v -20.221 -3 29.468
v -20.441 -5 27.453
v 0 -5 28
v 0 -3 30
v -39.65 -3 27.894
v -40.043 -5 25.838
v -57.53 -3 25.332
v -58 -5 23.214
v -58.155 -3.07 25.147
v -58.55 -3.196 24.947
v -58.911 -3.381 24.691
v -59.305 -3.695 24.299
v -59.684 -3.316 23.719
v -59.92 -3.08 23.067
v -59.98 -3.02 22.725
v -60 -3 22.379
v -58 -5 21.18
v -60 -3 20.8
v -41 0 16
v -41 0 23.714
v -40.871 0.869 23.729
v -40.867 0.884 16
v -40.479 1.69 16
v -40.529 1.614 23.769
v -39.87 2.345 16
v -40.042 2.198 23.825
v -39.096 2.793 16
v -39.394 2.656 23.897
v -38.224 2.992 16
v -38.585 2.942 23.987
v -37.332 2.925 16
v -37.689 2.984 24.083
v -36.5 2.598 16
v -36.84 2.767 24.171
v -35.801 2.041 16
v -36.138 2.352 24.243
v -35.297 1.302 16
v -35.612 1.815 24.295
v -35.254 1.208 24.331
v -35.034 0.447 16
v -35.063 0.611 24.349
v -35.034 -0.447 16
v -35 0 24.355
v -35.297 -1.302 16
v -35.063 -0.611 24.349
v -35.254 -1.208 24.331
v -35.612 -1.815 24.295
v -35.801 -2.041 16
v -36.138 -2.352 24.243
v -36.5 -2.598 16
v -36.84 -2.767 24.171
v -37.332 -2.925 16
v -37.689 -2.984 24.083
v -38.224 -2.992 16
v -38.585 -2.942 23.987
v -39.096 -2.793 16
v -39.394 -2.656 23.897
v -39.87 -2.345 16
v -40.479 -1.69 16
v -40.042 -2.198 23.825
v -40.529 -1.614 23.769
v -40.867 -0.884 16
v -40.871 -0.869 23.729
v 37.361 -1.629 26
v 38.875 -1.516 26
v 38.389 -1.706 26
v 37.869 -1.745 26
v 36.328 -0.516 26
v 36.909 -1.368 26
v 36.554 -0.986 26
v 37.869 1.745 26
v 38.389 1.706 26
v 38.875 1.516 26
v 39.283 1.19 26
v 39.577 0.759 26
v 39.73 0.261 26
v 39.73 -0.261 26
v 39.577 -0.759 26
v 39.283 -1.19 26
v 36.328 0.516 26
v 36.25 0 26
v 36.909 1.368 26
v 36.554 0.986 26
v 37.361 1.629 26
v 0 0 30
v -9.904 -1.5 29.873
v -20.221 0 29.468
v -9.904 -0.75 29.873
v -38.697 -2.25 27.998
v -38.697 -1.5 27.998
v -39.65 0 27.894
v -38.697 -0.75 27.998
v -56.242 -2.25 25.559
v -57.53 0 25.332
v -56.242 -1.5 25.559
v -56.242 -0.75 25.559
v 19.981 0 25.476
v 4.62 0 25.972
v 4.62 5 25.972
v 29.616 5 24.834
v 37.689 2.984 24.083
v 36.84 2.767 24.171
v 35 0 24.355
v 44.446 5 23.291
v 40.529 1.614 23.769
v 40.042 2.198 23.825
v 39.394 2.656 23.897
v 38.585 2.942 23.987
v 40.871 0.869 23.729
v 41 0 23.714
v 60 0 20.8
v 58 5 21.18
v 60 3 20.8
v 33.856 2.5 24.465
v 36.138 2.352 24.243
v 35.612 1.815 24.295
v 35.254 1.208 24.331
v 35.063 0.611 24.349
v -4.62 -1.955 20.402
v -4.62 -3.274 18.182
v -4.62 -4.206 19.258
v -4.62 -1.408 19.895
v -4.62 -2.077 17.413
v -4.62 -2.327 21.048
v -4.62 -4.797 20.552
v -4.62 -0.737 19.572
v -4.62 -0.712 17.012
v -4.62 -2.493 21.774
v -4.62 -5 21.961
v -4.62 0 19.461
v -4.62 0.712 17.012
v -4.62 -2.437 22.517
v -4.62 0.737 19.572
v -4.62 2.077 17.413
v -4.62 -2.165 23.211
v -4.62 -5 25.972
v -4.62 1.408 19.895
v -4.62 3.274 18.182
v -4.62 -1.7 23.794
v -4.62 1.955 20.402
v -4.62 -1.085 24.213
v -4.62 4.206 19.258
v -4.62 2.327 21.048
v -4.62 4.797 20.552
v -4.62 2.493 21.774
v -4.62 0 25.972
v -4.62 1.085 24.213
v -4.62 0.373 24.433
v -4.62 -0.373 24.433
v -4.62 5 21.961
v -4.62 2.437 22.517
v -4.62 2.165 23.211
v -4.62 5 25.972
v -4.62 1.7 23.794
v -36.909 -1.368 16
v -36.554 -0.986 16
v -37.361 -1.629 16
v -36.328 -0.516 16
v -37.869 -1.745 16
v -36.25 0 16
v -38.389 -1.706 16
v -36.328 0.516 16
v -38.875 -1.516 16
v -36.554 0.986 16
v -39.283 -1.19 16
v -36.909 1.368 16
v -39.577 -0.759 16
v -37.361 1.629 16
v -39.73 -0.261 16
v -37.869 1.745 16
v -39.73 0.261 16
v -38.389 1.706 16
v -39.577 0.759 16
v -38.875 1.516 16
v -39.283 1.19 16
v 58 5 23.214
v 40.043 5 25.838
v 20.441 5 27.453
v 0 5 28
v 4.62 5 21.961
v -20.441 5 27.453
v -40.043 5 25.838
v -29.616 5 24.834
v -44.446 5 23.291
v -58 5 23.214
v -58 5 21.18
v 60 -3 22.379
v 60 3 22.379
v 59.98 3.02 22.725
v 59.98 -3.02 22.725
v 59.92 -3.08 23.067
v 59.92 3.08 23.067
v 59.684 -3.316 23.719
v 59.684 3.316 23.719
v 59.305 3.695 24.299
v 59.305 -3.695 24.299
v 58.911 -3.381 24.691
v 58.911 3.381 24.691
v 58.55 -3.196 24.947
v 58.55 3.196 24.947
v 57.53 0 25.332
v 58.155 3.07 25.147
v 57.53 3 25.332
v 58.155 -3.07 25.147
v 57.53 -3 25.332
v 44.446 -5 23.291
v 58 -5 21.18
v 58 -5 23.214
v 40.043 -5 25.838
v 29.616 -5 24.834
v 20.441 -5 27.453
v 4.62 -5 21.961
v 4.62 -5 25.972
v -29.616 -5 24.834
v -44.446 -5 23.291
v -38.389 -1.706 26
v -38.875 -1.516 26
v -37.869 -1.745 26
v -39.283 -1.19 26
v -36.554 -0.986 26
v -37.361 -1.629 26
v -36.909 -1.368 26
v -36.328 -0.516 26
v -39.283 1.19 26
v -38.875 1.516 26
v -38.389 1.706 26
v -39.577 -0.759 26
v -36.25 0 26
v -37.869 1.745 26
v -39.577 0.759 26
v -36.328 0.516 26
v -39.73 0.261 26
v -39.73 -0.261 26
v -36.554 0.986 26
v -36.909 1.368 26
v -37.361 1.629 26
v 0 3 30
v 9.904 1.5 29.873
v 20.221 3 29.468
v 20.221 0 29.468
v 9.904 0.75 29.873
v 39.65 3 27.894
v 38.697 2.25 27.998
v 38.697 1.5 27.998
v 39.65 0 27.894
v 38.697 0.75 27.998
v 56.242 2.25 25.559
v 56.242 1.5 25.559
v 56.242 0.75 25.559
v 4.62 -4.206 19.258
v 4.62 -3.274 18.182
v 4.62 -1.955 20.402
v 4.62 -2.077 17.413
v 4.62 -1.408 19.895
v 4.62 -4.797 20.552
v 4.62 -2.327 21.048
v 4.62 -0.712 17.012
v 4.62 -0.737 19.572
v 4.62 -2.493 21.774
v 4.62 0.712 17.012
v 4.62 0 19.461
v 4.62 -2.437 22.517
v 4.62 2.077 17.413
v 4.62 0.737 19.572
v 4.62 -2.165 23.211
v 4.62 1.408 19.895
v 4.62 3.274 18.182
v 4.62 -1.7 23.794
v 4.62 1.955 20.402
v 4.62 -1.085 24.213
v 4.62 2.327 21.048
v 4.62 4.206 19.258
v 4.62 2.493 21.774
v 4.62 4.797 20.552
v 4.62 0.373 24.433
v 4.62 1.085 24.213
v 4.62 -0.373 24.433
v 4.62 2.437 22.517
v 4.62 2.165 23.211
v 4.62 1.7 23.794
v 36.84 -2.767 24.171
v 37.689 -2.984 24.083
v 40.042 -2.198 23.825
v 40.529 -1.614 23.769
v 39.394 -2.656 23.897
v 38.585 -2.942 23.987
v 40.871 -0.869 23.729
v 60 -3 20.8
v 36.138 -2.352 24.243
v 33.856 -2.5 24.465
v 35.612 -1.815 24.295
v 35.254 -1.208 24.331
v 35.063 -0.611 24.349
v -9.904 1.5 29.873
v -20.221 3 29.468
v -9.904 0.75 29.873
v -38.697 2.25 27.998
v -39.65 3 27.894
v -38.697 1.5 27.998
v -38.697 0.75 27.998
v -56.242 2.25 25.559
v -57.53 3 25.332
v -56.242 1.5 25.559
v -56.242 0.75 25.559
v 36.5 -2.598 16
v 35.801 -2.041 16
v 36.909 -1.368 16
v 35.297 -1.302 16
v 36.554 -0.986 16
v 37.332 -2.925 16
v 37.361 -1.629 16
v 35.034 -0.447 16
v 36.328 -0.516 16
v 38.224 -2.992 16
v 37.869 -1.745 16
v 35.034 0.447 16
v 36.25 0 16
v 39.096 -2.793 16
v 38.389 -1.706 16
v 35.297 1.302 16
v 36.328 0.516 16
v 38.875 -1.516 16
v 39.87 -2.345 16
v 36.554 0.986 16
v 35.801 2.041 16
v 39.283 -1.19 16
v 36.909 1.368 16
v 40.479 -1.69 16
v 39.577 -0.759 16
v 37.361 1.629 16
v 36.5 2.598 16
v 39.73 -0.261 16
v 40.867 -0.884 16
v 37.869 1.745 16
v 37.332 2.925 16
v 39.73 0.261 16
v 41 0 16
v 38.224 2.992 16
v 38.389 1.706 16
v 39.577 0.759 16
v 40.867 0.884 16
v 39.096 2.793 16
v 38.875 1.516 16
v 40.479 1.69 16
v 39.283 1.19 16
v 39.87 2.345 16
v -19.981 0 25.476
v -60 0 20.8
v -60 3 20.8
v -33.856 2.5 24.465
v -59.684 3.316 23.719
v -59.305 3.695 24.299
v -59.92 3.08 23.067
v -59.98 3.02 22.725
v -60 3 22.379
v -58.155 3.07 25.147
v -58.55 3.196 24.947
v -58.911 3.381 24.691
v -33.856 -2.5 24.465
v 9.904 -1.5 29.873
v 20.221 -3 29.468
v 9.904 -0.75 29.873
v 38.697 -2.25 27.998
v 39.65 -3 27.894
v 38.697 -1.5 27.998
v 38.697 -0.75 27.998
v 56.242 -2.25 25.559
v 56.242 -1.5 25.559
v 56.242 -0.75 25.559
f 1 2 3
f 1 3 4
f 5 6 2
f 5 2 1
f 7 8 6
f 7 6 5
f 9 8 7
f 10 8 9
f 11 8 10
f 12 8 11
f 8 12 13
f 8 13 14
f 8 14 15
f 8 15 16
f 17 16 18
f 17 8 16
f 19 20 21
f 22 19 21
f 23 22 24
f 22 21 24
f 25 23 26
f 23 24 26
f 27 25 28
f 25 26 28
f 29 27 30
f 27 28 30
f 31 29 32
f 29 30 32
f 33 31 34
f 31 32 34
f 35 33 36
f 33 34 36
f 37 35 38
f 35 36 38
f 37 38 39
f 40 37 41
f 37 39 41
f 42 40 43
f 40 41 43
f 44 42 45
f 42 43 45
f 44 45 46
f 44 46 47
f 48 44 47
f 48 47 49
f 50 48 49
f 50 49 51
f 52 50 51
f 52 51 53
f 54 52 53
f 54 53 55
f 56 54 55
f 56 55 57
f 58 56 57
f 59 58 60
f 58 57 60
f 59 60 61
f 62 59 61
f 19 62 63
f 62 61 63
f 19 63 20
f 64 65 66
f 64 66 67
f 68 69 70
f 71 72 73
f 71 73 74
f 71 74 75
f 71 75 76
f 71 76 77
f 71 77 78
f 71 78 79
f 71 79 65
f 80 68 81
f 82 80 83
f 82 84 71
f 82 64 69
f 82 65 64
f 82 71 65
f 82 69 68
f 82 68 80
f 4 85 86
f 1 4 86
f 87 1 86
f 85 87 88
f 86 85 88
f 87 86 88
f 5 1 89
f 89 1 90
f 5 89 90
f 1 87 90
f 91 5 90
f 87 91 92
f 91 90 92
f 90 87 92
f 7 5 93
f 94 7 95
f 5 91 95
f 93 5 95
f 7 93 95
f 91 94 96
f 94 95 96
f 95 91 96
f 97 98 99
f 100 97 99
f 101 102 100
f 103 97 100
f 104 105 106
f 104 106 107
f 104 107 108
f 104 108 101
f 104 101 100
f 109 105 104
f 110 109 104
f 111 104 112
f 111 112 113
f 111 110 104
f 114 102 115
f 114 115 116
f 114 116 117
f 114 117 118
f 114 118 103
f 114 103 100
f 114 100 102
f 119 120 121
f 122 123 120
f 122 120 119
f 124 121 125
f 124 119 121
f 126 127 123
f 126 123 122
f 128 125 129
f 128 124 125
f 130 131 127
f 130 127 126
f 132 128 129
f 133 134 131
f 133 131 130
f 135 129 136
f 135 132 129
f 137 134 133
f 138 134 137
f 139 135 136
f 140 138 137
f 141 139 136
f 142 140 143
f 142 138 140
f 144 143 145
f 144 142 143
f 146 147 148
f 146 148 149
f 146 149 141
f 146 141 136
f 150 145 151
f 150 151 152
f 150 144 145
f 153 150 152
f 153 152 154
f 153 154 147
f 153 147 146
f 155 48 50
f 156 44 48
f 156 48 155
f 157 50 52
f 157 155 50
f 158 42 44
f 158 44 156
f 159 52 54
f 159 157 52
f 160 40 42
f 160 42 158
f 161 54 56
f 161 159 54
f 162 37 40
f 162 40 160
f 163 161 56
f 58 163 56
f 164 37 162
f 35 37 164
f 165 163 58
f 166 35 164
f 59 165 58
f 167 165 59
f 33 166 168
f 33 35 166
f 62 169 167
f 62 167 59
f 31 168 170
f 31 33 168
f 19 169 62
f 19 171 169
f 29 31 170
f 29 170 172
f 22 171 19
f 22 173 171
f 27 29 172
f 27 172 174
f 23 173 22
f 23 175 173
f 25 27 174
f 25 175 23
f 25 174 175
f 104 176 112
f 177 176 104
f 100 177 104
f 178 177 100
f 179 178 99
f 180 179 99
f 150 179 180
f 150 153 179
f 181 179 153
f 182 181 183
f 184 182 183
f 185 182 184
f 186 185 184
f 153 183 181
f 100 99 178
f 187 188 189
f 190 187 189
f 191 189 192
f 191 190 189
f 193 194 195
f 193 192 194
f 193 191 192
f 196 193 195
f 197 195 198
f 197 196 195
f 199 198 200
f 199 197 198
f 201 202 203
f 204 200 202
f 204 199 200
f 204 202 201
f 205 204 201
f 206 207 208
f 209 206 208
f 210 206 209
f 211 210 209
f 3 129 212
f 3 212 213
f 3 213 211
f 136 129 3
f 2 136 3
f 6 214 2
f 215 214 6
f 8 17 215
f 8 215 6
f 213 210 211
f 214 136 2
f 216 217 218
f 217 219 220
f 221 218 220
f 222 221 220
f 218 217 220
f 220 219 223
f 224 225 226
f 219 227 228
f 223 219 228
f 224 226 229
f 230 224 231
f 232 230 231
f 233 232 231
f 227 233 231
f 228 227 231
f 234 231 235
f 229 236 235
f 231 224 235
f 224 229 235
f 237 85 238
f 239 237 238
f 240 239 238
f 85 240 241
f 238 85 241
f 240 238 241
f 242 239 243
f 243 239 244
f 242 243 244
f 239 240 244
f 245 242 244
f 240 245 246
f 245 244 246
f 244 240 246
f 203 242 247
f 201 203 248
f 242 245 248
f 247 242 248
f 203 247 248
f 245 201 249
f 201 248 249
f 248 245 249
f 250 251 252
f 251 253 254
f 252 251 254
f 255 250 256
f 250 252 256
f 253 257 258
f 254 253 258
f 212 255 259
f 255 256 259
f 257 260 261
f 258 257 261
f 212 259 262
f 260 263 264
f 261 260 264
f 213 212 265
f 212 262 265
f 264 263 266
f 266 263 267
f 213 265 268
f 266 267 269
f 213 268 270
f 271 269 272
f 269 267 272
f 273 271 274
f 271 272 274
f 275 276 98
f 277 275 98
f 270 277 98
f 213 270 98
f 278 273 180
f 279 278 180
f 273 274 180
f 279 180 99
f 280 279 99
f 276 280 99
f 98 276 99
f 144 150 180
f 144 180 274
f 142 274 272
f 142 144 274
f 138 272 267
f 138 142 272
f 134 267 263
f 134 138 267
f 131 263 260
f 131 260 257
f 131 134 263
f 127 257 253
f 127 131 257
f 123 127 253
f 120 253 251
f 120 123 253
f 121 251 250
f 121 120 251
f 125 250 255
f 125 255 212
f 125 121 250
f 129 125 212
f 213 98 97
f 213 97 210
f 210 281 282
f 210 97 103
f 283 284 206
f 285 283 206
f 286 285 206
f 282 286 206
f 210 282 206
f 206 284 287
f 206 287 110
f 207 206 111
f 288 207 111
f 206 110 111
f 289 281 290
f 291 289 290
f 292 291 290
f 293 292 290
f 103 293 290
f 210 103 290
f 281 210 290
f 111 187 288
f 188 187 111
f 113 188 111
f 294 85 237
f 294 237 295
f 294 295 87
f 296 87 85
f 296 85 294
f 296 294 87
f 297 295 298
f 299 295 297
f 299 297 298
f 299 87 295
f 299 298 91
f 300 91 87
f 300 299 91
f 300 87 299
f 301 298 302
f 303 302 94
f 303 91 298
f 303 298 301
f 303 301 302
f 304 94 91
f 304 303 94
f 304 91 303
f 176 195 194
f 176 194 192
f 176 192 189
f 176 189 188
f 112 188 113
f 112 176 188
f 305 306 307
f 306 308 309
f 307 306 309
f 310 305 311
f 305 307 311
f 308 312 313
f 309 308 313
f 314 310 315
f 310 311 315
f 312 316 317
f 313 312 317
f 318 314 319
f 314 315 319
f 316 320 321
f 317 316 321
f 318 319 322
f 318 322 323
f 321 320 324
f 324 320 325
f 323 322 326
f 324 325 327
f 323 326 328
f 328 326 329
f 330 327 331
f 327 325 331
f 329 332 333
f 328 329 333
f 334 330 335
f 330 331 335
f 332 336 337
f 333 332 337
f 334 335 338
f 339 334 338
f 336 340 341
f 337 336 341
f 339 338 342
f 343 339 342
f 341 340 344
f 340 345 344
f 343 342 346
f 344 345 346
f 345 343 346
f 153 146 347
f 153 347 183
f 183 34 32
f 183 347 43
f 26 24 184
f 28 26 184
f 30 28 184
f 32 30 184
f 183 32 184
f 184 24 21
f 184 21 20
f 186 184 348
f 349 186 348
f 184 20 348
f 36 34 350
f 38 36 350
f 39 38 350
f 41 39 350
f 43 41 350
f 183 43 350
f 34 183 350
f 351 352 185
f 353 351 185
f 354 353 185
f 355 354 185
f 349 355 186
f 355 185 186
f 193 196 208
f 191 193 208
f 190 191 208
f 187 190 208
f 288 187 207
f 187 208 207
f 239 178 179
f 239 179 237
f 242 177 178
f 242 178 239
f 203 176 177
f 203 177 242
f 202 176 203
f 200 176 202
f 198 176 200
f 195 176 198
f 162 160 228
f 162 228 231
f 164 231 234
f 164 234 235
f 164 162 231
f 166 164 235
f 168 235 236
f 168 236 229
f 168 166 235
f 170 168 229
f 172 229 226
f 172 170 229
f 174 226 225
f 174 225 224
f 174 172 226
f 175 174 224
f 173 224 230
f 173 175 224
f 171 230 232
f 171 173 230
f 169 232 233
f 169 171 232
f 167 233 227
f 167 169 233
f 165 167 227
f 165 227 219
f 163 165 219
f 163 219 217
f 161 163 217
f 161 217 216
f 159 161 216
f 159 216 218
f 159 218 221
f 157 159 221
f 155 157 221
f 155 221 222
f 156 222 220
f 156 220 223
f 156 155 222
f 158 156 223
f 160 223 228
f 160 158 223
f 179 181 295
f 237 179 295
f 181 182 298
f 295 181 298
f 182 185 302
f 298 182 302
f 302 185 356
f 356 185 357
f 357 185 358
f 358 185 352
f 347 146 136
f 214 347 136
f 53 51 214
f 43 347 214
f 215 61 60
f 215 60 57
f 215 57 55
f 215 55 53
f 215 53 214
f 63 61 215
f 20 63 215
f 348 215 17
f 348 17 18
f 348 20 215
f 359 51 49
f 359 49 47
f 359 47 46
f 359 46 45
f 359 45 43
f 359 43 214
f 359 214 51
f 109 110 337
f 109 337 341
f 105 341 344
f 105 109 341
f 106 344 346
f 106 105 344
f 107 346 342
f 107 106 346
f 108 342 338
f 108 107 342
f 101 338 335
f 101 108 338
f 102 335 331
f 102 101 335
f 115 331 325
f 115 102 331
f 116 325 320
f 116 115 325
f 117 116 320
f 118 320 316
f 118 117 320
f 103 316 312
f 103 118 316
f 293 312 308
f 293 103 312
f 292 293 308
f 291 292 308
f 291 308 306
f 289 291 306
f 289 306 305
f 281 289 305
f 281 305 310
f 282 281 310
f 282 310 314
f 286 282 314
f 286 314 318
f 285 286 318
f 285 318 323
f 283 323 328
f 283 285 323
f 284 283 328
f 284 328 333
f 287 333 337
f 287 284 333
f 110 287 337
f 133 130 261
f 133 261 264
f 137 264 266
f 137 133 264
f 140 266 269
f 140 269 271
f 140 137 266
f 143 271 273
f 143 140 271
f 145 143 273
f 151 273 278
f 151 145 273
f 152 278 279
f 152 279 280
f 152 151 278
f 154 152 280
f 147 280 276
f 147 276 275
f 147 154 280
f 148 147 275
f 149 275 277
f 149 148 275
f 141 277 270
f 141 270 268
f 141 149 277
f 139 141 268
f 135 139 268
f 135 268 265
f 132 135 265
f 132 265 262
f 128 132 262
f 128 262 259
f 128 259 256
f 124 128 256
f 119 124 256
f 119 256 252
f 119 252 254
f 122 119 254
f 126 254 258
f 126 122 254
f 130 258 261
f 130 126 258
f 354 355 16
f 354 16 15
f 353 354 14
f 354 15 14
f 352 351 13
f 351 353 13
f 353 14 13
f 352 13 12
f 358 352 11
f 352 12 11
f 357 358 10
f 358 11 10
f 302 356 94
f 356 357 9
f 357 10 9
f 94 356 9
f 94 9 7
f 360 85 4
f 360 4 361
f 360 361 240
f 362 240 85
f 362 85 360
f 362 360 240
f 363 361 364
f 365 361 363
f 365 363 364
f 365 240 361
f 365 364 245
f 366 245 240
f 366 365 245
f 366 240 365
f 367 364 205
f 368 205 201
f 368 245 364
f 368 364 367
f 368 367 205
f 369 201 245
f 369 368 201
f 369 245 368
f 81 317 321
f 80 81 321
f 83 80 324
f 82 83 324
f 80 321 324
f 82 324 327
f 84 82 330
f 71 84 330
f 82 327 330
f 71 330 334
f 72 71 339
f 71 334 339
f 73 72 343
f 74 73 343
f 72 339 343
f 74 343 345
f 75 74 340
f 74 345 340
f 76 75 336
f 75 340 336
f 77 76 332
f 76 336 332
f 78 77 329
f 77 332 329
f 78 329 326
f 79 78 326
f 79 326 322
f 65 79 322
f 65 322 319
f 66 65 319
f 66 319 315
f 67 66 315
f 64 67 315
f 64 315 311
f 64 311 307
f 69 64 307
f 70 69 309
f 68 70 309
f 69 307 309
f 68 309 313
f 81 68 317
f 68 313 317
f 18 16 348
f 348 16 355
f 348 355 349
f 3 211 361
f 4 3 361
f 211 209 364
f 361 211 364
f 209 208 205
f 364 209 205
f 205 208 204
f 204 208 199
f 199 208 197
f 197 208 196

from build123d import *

# Parameters (mm, degrees)
SALIENTE_EXTRUIR2_DEPTH      = 5
CROQUIS6_R                   = 3
SALIENTE_EXTRUIR3_DEPTH      = 10
CROQUIS7_R                   = 1.75
CORTAR_EXTRUIR1_DEPTH        = 10
CHAFL_N1_SIZE                = 2
REDONDEO2_START              = -5.0000001
REDONDEO2_DEPTH              = 10.0000002
SALIENTE_EXTRUIR8_DEPTH      = 4.62
SALIENTE_EXTRUIR8_DEPTH_BACK = 4.62
CROQUIS17_R                  = 2.5


with BuildPart() as part:
    # Croquis5 → Saliente-Extruir2 (new, symmetric)
    with BuildSketch(Plane(origin=(0, 0, 0), x_dir=(1, 0, 0), z_dir=(0, 1, 0))):
        with BuildLine():
            Line((0, -26), (0, -30))
            add(Edge.make_bspline(
                [(0, -30), (3.306526268, -30), (16.53263134, -29.831217065), (35.997648536, -28.565345051), (52.057120801, -26.333176426), (58.766277483, -25.109762555), (60, -24.873829164)],
                knots=[4.71238898, 4.71238898, 4.71238898, 4.71238898, 4.810563751, 5.105088062, 5.301437603, 5.346535107, 5.346535107, 5.346535107, 5.346535107], degree=3))
            Line((60, -24.873829164), (60, -20.8))
            add(Edge.make_bspline(
                [(0, -26), (33.333333333, -26), (60, -20.8)],
                knots=[4.71238898, 4.71238898, 4.71238898, 5.355890089, 5.355890089, 5.355890089], degree=2, weights=[1, 0.948683298, 1]))
        make_face()
    extrude(amount=SALIENTE_EXTRUIR2_DEPTH, both=True)

    # Croquis6 → Saliente-Extruir3 (add)
    with BuildSketch(Plane.XY.offset(26)):
        with Locations((38, 0)):
            Circle(CROQUIS6_R)
    extrude(amount=-SALIENTE_EXTRUIR3_DEPTH)

    # Croquis7 → Cortar-Extruir1 (cut)
    with BuildSketch(Plane(origin=(0, 0, 16), x_dir=(-1, 0, 0), z_dir=(0, 0, -1))):
        with Locations((-38, 0)):
            Circle(CROQUIS7_R)
    extrude(amount=-CORTAR_EXTRUIR1_DEPTH, mode=Mode.SUBTRACT)

    # Chaflán1
    chafl_n1_edges = [part.edges().sort_by_distance(p)[0] for p in [
        (60, -5, 22.836914582),
        (60, 5, 22.836914582),
        (30.12007931, -5, 28.805559056),
        (30.12007931, 5, 28.805559056),
    ]]
    chamfer(chafl_n1_edges, length=CHAFL_N1_SIZE)

    # Redondeo2: read off the stored shape, not the designer's step
    # Redondeo2 outline → Redondeo2 (cut)
    with BuildSketch(Plane(origin=(0, 0, 0), x_dir=(1, 0, 0), z_dir=(0, 1, 0)).offset(REDONDEO2_START)):
        with BuildLine():
            Line((60, -24.873829164), (60, -22.378802425))
            ThreePointArc((60, -22.378802425), (59.301153244, -24.303560526), (57.530204169, -25.331577991))
            add(Edge.make_bspline(
                [(57.530204169, -25.331577991), (58.36173126, -25.182267919), (59.185100773, -25.029668046), (60, -24.873829164)],
                knots=[5.316747273, 5.316747273, 5.316747273, 5.316747273, 5.346535107, 5.346535107, 5.346535107, 5.346535107], degree=3))
        make_face()
    extrude(amount=REDONDEO2_DEPTH, mode=Mode.SUBTRACT)

    # Croquis17 → Saliente-Extruir8 (add, two sides: drawn at the far end of the back side and taken through both)
    with BuildSketch(Plane(origin=(0, 0, 0), x_dir=(0, 0, -1), z_dir=(1, 0, 0)).offset(-SALIENTE_EXTRUIR8_DEPTH_BACK)):
        with BuildLine():
            ThreePointArc((-21.96097599, 5), (-16.96097599, 0), (-21.96097599, -5))
            Line((-21.96097599, -5), (-26.96097599, -5))
            Line((-26.96097599, -5), (-26.96097599, 5))
            Line((-26.96097599, 5), (-21.96097599, 5))
        make_face()
        with Locations((-21.96097599, 0)):
            Circle(CROQUIS17_R, mode=Mode.SUBTRACT)
    extrude(amount=SALIENTE_EXTRUIR8_DEPTH + SALIENTE_EXTRUIR8_DEPTH_BACK)

    # Simetría2: part across plane


with BuildPart() as part_1:
    add(part.part)
    add(part.part.mirror(Plane(origin=(0, 0, 0), x_dir=(0, 0, 1), z_dir=(1, 0, 0))))


solid = part_1.part
